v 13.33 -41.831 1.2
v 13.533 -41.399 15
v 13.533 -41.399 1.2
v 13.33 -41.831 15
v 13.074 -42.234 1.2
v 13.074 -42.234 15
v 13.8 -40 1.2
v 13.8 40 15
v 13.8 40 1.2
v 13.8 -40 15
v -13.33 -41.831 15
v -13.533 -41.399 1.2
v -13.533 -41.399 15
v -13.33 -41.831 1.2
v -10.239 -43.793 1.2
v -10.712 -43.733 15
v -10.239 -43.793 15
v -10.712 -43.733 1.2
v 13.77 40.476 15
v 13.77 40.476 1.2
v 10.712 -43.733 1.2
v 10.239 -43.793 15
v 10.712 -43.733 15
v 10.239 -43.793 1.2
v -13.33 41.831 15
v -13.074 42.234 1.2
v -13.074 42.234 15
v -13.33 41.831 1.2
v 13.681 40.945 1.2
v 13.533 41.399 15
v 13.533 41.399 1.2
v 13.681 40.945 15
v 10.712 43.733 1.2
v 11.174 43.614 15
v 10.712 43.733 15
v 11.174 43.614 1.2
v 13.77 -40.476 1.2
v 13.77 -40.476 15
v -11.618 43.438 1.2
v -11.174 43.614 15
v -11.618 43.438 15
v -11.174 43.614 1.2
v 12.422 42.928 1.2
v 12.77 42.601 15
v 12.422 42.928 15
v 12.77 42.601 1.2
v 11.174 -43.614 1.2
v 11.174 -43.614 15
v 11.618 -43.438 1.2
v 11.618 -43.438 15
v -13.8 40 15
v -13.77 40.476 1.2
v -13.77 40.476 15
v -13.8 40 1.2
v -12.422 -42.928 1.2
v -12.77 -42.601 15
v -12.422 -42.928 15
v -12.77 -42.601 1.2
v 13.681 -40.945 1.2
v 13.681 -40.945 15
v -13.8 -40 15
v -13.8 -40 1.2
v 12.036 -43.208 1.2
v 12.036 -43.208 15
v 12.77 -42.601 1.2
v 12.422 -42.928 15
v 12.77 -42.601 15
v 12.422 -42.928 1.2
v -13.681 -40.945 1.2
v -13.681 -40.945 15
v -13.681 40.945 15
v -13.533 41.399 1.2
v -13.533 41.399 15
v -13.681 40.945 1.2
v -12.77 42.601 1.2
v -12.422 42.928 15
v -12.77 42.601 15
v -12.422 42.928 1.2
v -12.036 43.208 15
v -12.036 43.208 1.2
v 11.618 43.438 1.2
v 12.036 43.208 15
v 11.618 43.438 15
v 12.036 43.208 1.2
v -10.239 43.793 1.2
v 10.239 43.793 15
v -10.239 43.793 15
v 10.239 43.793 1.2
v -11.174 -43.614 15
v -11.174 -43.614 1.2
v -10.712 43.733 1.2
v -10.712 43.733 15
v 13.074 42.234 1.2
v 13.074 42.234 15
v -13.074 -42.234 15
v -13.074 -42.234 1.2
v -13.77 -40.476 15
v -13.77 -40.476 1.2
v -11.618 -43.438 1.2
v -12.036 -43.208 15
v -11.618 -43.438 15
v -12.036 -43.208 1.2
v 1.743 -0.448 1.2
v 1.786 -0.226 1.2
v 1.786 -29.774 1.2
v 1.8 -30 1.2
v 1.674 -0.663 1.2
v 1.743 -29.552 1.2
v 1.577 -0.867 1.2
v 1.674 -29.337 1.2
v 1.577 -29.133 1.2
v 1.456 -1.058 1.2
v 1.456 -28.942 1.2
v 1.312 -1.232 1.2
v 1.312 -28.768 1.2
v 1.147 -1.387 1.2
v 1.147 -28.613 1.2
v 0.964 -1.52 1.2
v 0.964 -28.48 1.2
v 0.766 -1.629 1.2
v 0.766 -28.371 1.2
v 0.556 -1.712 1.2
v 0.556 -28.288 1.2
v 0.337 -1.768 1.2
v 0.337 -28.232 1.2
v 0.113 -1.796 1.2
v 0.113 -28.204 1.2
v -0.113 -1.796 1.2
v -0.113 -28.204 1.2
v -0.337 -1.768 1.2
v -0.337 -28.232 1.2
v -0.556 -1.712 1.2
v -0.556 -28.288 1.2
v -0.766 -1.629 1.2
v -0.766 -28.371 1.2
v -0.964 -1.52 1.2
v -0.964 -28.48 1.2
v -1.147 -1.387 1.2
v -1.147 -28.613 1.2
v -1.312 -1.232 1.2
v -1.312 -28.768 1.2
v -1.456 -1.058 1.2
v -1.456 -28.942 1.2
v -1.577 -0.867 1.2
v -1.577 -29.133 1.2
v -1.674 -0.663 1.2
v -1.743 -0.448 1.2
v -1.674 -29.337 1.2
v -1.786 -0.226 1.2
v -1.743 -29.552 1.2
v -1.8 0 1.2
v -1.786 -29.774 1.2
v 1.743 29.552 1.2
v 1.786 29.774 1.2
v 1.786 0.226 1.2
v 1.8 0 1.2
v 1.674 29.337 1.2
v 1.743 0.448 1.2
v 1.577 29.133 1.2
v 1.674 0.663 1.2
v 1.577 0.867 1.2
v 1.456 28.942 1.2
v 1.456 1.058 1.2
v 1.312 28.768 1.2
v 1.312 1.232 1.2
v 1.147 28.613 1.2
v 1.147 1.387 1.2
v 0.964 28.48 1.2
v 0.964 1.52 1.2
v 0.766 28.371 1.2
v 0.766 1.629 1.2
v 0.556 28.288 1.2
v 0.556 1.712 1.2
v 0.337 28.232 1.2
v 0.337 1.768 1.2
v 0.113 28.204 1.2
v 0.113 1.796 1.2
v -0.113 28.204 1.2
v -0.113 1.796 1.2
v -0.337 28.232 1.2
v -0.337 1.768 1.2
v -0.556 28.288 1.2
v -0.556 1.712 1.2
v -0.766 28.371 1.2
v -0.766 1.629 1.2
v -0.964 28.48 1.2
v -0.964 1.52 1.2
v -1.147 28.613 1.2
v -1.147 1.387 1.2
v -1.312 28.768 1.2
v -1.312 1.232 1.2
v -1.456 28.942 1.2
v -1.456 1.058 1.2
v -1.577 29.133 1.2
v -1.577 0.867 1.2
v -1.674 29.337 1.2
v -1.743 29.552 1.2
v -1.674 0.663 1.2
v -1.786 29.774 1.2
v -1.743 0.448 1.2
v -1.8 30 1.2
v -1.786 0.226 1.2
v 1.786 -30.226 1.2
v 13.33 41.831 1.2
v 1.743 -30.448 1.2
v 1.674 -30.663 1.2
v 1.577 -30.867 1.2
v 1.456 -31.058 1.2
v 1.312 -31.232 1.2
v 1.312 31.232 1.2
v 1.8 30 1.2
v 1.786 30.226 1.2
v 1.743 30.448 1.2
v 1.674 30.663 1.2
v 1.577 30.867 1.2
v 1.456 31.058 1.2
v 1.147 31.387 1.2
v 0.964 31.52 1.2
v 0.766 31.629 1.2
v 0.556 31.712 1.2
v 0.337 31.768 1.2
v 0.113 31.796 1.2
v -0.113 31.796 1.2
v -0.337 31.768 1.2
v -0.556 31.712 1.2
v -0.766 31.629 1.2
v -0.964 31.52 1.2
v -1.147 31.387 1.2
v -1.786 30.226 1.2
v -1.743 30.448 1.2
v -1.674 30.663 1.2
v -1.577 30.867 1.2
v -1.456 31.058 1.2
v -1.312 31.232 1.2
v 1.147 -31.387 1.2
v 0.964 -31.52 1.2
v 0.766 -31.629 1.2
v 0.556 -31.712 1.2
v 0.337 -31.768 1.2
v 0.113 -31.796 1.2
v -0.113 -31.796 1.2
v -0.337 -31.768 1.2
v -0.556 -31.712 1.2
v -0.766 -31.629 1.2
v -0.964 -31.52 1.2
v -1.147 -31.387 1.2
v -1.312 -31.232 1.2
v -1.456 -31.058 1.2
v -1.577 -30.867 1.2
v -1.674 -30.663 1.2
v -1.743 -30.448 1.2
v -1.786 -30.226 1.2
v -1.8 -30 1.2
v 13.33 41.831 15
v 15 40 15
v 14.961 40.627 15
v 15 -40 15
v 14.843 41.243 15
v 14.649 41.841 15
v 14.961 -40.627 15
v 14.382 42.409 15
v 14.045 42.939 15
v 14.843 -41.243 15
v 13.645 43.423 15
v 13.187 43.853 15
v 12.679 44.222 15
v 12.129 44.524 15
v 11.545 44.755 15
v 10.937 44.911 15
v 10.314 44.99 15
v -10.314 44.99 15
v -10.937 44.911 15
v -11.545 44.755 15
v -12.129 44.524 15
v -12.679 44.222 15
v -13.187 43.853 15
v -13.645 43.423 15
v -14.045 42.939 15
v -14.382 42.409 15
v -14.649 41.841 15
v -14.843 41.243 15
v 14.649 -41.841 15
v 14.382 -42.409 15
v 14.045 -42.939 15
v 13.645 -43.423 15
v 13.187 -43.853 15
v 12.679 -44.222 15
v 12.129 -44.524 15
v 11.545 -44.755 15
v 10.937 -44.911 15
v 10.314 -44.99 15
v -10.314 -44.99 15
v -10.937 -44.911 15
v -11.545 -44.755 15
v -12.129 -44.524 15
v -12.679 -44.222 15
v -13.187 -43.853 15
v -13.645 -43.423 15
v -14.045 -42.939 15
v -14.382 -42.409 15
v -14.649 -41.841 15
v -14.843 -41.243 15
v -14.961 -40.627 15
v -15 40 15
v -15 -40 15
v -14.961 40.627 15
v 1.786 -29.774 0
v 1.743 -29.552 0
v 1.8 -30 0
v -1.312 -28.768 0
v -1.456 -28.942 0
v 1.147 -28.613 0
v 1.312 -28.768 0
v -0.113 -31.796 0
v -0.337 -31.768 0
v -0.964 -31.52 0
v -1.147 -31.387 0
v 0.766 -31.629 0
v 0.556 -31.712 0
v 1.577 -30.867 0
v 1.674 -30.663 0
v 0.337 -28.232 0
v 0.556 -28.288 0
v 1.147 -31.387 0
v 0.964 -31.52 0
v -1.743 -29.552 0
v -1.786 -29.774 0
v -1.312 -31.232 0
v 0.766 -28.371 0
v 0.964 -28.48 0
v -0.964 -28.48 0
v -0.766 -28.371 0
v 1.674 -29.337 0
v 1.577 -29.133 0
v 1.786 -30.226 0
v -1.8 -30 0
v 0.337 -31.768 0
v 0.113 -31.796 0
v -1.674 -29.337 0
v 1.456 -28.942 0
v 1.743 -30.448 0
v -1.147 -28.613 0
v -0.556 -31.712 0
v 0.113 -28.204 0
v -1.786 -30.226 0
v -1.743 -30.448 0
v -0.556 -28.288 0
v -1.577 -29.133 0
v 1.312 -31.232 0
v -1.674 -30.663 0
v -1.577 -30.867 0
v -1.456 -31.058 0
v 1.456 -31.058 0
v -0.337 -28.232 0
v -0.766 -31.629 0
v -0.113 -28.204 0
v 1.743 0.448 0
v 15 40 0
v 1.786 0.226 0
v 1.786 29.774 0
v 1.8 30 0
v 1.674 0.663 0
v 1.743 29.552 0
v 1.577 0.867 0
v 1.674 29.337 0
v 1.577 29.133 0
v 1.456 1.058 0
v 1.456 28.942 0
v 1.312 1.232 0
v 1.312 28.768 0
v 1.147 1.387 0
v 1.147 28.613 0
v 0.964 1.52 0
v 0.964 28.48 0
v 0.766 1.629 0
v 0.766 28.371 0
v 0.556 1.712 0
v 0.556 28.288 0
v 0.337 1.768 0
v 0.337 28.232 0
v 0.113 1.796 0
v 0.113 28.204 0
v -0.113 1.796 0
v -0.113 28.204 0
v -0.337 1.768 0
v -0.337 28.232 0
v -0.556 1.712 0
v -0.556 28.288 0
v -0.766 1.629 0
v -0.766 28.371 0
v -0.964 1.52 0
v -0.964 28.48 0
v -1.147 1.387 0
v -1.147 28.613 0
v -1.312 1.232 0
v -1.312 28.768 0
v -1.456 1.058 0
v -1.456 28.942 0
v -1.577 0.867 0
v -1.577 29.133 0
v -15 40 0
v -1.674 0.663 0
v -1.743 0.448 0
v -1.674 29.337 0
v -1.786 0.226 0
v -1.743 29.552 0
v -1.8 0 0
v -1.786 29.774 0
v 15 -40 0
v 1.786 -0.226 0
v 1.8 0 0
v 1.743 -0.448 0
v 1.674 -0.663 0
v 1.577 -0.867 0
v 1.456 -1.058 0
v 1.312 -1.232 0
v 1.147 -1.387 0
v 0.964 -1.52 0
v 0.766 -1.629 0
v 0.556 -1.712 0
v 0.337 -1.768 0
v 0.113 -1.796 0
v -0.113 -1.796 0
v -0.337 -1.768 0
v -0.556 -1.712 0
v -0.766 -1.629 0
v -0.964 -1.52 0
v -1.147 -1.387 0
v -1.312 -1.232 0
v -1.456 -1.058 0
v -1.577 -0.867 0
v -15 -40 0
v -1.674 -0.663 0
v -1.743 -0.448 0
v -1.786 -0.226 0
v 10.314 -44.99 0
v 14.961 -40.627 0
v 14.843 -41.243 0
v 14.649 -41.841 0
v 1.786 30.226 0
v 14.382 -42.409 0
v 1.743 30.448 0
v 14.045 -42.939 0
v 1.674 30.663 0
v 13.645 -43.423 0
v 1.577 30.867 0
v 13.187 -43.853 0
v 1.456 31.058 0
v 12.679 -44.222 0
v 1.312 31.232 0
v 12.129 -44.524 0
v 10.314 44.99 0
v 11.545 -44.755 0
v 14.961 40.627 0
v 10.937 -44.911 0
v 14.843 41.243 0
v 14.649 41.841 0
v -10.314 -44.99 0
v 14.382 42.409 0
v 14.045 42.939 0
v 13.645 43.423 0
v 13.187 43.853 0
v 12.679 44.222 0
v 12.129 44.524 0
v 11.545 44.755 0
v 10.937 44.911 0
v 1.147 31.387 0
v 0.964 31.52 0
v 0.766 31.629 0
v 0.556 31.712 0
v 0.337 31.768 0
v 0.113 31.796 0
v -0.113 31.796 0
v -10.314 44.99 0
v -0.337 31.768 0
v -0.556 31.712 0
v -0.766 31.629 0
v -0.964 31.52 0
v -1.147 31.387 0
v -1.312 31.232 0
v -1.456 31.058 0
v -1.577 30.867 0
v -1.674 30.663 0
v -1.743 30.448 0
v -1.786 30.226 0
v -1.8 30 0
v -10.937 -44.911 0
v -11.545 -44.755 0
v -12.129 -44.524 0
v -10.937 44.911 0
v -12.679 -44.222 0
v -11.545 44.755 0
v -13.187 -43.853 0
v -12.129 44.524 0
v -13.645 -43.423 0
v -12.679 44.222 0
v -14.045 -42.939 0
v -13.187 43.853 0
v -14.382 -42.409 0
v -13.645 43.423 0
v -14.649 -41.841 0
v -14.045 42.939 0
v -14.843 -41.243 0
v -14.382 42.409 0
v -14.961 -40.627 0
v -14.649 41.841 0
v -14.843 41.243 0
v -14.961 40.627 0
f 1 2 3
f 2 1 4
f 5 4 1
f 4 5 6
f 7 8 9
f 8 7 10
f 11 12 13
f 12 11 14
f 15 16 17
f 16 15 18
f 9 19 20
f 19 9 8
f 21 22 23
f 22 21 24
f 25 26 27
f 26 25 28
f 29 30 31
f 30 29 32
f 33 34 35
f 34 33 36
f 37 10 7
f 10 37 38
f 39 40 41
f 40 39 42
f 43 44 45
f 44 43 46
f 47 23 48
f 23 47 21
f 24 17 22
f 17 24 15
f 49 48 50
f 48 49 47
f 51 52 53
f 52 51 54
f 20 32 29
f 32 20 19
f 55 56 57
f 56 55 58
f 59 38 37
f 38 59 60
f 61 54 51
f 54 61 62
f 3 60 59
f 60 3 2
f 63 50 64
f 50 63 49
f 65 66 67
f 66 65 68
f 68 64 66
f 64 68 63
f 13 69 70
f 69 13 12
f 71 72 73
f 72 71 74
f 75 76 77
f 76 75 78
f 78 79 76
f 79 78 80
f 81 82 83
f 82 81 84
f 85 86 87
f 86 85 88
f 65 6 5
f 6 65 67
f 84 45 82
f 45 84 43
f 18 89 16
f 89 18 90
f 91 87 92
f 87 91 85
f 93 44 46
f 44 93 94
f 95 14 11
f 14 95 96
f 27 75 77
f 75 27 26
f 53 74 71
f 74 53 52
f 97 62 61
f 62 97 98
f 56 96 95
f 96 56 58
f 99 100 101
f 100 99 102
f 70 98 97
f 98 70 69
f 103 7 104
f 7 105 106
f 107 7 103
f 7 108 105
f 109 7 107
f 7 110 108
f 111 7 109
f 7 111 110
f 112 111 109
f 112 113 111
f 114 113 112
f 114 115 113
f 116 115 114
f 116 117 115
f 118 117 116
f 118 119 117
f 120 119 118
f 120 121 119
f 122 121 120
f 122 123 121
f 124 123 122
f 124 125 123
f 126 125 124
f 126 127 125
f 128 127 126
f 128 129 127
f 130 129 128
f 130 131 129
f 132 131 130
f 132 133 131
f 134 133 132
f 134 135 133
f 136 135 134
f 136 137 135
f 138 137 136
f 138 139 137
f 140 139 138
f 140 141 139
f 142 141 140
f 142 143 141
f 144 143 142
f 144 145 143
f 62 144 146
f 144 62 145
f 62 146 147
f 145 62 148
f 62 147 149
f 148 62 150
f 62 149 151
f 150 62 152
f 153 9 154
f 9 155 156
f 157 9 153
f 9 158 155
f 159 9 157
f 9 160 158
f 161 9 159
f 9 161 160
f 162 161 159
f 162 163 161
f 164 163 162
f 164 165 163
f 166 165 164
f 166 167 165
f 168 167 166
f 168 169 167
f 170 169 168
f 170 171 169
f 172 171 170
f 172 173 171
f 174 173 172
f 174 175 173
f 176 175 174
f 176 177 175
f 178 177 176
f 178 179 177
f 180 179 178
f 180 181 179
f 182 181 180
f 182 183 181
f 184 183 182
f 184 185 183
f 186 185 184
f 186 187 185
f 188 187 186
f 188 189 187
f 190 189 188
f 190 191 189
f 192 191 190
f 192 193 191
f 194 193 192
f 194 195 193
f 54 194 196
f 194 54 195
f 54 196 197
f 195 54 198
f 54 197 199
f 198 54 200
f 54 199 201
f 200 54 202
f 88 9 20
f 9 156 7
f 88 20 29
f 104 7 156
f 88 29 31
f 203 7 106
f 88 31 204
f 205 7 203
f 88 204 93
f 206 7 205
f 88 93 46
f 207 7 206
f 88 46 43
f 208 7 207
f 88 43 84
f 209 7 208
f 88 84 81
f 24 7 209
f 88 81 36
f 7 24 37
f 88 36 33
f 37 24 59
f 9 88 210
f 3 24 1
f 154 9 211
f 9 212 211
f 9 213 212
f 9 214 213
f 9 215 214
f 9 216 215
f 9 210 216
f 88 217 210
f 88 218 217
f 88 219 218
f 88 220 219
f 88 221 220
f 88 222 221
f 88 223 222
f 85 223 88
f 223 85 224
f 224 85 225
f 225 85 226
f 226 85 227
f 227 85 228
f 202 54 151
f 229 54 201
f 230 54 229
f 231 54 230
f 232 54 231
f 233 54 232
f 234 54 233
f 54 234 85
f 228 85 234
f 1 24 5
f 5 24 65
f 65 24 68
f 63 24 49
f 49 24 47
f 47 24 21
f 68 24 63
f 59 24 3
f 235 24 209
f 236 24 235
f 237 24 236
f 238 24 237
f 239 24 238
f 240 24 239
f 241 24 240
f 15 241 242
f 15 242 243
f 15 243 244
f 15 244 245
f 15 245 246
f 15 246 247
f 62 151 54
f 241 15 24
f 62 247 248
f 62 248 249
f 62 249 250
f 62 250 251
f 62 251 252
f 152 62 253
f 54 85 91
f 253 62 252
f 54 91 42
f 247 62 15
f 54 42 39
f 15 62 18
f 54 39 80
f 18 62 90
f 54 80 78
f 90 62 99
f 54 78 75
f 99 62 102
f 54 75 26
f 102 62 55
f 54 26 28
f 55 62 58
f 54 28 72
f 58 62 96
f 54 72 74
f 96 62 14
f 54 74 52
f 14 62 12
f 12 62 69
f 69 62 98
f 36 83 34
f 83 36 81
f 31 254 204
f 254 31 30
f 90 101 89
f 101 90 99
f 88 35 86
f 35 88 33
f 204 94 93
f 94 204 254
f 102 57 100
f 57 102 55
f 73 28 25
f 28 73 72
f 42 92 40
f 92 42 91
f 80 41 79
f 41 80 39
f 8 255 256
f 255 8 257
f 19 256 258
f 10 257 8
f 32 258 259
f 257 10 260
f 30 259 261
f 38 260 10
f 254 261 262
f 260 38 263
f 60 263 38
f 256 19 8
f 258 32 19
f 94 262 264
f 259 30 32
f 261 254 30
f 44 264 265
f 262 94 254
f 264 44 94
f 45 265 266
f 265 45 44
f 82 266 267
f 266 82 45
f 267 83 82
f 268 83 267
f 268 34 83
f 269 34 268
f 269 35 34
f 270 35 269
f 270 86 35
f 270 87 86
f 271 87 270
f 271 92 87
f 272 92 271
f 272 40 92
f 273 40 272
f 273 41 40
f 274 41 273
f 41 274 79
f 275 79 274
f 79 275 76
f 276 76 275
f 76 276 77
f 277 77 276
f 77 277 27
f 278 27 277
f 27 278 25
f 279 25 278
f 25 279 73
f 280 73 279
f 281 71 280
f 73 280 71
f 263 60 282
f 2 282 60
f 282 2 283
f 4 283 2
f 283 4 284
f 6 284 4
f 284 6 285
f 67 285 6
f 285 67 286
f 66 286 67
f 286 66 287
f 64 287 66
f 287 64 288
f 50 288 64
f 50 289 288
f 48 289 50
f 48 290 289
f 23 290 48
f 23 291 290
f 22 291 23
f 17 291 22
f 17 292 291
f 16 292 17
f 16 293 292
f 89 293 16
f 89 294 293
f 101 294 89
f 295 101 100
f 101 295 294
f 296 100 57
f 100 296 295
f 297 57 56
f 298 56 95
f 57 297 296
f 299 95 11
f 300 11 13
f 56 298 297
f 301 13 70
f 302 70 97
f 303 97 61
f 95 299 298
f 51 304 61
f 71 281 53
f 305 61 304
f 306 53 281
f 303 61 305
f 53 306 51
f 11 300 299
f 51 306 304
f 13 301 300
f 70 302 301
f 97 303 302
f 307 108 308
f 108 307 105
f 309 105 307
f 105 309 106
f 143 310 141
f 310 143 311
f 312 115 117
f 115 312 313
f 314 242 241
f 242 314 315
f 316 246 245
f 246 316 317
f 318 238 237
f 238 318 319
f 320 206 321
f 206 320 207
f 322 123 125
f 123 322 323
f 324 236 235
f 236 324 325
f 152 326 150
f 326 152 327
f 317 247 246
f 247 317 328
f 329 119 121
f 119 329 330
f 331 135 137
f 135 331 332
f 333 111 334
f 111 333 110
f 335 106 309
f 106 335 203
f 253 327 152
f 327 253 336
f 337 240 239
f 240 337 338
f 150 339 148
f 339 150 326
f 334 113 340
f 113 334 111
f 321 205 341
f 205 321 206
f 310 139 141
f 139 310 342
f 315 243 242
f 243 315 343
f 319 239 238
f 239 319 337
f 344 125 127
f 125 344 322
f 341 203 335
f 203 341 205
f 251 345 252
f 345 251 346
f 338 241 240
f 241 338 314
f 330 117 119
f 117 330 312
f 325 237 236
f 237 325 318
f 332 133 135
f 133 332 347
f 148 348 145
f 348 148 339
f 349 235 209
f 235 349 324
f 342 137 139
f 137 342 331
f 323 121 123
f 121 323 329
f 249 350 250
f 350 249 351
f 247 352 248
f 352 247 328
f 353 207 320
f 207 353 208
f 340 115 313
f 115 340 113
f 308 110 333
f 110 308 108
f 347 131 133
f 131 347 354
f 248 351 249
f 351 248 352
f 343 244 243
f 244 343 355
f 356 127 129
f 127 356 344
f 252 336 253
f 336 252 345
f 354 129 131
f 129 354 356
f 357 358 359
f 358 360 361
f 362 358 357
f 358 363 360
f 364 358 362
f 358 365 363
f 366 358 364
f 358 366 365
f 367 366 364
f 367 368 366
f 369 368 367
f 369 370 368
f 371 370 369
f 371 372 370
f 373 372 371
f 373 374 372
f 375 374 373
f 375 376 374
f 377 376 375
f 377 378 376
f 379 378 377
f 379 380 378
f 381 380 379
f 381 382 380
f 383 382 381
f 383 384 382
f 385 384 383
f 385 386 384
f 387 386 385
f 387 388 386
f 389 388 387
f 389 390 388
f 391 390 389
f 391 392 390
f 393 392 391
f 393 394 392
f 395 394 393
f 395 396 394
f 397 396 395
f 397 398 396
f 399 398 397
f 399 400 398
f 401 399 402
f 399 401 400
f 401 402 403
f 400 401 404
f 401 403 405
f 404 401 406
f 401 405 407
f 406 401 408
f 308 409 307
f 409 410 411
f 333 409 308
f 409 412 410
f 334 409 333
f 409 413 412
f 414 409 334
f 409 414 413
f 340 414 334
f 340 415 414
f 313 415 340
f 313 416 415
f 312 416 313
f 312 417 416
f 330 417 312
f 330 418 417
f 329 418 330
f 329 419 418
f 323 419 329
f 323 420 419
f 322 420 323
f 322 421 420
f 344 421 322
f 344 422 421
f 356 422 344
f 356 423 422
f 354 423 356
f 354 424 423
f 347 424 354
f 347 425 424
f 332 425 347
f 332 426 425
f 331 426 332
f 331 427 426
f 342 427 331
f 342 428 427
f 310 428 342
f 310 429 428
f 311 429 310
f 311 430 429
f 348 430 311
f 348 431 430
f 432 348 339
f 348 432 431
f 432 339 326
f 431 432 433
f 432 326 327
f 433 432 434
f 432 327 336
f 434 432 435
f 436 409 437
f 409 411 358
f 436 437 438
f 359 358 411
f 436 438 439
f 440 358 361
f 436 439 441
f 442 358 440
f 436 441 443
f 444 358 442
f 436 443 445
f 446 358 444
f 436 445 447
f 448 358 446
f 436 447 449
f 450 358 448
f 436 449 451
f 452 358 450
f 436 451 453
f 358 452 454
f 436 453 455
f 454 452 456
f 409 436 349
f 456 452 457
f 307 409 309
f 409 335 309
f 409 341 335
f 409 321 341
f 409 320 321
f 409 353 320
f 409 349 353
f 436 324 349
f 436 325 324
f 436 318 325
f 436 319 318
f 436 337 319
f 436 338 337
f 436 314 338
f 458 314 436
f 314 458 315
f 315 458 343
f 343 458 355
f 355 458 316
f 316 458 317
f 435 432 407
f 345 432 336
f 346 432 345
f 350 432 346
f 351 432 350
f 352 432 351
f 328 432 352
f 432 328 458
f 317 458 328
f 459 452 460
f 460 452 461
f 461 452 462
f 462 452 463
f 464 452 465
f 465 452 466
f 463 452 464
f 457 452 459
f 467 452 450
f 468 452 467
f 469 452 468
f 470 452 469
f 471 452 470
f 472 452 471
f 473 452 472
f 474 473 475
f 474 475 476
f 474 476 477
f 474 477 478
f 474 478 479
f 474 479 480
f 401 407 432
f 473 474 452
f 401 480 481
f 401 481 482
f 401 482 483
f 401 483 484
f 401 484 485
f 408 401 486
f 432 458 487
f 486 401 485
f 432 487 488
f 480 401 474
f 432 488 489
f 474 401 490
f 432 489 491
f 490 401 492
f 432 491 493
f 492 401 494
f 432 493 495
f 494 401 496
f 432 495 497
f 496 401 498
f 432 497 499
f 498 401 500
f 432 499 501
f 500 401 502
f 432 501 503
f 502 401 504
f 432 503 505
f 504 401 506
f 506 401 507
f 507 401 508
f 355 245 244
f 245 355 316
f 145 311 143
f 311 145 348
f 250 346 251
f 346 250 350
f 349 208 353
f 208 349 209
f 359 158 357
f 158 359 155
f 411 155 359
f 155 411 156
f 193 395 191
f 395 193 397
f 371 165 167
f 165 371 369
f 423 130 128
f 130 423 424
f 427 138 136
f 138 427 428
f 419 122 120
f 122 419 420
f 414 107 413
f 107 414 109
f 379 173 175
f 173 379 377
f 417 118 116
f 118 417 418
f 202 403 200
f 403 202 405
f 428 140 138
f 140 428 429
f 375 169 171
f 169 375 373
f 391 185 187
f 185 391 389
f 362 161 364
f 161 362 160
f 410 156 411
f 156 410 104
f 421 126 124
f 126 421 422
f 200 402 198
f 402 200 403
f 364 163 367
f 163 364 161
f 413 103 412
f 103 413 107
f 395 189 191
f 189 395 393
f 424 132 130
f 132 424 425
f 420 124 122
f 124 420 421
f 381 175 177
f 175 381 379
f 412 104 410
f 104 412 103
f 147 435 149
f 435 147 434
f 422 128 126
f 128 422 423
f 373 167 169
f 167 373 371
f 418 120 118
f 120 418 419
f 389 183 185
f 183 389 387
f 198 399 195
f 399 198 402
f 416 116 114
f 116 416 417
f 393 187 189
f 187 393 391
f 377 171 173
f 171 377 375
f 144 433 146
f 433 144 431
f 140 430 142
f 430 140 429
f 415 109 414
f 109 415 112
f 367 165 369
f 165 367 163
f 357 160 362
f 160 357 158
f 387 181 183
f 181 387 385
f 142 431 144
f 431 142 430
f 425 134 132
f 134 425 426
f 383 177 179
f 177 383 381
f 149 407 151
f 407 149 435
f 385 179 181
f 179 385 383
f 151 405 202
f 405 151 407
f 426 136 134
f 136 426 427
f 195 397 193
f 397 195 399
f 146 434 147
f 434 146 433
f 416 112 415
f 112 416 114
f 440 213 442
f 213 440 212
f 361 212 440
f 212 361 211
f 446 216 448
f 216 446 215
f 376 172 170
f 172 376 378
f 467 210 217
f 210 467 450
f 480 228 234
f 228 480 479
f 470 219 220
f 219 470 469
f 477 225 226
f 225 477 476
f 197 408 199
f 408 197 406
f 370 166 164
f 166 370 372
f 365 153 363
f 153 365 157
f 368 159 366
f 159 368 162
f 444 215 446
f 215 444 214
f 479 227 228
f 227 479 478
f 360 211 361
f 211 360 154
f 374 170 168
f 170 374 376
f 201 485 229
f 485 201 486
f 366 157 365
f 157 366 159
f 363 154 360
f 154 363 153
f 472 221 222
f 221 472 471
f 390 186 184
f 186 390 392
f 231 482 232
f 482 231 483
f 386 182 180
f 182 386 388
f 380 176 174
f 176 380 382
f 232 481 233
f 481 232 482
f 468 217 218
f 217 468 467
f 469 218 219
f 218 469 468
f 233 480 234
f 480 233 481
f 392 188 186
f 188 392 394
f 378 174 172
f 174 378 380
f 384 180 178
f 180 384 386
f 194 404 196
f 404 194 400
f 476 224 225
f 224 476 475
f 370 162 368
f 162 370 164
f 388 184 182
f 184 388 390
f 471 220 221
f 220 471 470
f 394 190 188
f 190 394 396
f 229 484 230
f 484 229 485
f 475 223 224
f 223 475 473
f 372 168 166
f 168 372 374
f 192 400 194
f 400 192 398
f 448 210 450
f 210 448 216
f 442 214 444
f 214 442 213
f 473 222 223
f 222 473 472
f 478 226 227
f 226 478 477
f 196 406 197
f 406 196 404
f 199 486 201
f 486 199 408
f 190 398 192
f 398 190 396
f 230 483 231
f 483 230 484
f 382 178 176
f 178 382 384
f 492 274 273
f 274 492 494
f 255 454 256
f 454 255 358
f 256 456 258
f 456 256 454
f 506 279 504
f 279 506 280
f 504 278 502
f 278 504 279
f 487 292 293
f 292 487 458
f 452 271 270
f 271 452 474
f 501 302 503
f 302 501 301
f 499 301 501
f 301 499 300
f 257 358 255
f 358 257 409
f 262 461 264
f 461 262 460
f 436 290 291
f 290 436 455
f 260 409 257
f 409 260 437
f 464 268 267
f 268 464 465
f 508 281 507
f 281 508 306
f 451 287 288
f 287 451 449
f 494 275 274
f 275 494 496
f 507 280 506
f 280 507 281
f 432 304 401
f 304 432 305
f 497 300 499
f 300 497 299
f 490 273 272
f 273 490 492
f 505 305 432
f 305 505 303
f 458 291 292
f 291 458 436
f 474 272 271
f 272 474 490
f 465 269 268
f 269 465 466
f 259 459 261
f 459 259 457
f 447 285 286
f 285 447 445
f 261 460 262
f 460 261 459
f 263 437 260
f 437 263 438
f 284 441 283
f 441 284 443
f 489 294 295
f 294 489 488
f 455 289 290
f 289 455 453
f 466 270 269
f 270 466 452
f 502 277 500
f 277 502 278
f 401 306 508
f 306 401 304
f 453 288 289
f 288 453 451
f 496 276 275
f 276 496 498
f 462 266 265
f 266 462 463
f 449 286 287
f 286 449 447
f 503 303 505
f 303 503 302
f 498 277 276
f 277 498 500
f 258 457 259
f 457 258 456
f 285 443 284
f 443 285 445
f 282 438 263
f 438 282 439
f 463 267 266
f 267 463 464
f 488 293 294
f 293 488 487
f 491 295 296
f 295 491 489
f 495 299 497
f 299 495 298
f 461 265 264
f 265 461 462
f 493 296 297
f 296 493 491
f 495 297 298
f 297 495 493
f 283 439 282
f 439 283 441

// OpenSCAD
$fn = 50;


difference() {
	union() {
		hull() {
			translate(v = [-10.0000000000, 40.0000000000, 0]) {
				cylinder(h = 15, r = 5);
			}
			translate(v = [10.0000000000, 40.0000000000, 0]) {
				cylinder(h = 15, r = 5);
			}
			translate(v = [-10.0000000000, -40.0000000000, 0]) {
				cylinder(h = 15, r = 5);
			}
			translate(v = [10.0000000000, -40.0000000000, 0]) {
				cylinder(h = 15, r = 5);
			}
		}
	}
	union() {
		translate(v = [0, 0, 1.2000000000]) {
			hull() {
				translate(v = [-10.0000000000, 40.0000000000, 0]) {
					cylinder(h = 13.8000000000, r = 3.8000000000);
				}
				translate(v = [10.0000000000, 40.0000000000, 0]) {
					cylinder(h = 13.8000000000, r = 3.8000000000);
				}
				translate(v = [-10.0000000000, -40.0000000000, 0]) {
					cylinder(h = 13.8000000000, r = 3.8000000000);
				}
				translate(v = [10.0000000000, -40.0000000000, 0]) {
					cylinder(h = 13.8000000000, r = 3.8000000000);
				}
			}
		}
		#translate(v = [0.0000000000, -30.0000000000, 0]) {
			cylinder(h = 1.2000000000, r = 1.8000000000);
		}
		#cylinder(h = 1.2000000000, r = 1.8000000000);
		#translate(v = [0.0000000000, 30.0000000000, 0]) {
			cylinder(h = 1.2000000000, r = 1.8000000000);
		}
	}
}
